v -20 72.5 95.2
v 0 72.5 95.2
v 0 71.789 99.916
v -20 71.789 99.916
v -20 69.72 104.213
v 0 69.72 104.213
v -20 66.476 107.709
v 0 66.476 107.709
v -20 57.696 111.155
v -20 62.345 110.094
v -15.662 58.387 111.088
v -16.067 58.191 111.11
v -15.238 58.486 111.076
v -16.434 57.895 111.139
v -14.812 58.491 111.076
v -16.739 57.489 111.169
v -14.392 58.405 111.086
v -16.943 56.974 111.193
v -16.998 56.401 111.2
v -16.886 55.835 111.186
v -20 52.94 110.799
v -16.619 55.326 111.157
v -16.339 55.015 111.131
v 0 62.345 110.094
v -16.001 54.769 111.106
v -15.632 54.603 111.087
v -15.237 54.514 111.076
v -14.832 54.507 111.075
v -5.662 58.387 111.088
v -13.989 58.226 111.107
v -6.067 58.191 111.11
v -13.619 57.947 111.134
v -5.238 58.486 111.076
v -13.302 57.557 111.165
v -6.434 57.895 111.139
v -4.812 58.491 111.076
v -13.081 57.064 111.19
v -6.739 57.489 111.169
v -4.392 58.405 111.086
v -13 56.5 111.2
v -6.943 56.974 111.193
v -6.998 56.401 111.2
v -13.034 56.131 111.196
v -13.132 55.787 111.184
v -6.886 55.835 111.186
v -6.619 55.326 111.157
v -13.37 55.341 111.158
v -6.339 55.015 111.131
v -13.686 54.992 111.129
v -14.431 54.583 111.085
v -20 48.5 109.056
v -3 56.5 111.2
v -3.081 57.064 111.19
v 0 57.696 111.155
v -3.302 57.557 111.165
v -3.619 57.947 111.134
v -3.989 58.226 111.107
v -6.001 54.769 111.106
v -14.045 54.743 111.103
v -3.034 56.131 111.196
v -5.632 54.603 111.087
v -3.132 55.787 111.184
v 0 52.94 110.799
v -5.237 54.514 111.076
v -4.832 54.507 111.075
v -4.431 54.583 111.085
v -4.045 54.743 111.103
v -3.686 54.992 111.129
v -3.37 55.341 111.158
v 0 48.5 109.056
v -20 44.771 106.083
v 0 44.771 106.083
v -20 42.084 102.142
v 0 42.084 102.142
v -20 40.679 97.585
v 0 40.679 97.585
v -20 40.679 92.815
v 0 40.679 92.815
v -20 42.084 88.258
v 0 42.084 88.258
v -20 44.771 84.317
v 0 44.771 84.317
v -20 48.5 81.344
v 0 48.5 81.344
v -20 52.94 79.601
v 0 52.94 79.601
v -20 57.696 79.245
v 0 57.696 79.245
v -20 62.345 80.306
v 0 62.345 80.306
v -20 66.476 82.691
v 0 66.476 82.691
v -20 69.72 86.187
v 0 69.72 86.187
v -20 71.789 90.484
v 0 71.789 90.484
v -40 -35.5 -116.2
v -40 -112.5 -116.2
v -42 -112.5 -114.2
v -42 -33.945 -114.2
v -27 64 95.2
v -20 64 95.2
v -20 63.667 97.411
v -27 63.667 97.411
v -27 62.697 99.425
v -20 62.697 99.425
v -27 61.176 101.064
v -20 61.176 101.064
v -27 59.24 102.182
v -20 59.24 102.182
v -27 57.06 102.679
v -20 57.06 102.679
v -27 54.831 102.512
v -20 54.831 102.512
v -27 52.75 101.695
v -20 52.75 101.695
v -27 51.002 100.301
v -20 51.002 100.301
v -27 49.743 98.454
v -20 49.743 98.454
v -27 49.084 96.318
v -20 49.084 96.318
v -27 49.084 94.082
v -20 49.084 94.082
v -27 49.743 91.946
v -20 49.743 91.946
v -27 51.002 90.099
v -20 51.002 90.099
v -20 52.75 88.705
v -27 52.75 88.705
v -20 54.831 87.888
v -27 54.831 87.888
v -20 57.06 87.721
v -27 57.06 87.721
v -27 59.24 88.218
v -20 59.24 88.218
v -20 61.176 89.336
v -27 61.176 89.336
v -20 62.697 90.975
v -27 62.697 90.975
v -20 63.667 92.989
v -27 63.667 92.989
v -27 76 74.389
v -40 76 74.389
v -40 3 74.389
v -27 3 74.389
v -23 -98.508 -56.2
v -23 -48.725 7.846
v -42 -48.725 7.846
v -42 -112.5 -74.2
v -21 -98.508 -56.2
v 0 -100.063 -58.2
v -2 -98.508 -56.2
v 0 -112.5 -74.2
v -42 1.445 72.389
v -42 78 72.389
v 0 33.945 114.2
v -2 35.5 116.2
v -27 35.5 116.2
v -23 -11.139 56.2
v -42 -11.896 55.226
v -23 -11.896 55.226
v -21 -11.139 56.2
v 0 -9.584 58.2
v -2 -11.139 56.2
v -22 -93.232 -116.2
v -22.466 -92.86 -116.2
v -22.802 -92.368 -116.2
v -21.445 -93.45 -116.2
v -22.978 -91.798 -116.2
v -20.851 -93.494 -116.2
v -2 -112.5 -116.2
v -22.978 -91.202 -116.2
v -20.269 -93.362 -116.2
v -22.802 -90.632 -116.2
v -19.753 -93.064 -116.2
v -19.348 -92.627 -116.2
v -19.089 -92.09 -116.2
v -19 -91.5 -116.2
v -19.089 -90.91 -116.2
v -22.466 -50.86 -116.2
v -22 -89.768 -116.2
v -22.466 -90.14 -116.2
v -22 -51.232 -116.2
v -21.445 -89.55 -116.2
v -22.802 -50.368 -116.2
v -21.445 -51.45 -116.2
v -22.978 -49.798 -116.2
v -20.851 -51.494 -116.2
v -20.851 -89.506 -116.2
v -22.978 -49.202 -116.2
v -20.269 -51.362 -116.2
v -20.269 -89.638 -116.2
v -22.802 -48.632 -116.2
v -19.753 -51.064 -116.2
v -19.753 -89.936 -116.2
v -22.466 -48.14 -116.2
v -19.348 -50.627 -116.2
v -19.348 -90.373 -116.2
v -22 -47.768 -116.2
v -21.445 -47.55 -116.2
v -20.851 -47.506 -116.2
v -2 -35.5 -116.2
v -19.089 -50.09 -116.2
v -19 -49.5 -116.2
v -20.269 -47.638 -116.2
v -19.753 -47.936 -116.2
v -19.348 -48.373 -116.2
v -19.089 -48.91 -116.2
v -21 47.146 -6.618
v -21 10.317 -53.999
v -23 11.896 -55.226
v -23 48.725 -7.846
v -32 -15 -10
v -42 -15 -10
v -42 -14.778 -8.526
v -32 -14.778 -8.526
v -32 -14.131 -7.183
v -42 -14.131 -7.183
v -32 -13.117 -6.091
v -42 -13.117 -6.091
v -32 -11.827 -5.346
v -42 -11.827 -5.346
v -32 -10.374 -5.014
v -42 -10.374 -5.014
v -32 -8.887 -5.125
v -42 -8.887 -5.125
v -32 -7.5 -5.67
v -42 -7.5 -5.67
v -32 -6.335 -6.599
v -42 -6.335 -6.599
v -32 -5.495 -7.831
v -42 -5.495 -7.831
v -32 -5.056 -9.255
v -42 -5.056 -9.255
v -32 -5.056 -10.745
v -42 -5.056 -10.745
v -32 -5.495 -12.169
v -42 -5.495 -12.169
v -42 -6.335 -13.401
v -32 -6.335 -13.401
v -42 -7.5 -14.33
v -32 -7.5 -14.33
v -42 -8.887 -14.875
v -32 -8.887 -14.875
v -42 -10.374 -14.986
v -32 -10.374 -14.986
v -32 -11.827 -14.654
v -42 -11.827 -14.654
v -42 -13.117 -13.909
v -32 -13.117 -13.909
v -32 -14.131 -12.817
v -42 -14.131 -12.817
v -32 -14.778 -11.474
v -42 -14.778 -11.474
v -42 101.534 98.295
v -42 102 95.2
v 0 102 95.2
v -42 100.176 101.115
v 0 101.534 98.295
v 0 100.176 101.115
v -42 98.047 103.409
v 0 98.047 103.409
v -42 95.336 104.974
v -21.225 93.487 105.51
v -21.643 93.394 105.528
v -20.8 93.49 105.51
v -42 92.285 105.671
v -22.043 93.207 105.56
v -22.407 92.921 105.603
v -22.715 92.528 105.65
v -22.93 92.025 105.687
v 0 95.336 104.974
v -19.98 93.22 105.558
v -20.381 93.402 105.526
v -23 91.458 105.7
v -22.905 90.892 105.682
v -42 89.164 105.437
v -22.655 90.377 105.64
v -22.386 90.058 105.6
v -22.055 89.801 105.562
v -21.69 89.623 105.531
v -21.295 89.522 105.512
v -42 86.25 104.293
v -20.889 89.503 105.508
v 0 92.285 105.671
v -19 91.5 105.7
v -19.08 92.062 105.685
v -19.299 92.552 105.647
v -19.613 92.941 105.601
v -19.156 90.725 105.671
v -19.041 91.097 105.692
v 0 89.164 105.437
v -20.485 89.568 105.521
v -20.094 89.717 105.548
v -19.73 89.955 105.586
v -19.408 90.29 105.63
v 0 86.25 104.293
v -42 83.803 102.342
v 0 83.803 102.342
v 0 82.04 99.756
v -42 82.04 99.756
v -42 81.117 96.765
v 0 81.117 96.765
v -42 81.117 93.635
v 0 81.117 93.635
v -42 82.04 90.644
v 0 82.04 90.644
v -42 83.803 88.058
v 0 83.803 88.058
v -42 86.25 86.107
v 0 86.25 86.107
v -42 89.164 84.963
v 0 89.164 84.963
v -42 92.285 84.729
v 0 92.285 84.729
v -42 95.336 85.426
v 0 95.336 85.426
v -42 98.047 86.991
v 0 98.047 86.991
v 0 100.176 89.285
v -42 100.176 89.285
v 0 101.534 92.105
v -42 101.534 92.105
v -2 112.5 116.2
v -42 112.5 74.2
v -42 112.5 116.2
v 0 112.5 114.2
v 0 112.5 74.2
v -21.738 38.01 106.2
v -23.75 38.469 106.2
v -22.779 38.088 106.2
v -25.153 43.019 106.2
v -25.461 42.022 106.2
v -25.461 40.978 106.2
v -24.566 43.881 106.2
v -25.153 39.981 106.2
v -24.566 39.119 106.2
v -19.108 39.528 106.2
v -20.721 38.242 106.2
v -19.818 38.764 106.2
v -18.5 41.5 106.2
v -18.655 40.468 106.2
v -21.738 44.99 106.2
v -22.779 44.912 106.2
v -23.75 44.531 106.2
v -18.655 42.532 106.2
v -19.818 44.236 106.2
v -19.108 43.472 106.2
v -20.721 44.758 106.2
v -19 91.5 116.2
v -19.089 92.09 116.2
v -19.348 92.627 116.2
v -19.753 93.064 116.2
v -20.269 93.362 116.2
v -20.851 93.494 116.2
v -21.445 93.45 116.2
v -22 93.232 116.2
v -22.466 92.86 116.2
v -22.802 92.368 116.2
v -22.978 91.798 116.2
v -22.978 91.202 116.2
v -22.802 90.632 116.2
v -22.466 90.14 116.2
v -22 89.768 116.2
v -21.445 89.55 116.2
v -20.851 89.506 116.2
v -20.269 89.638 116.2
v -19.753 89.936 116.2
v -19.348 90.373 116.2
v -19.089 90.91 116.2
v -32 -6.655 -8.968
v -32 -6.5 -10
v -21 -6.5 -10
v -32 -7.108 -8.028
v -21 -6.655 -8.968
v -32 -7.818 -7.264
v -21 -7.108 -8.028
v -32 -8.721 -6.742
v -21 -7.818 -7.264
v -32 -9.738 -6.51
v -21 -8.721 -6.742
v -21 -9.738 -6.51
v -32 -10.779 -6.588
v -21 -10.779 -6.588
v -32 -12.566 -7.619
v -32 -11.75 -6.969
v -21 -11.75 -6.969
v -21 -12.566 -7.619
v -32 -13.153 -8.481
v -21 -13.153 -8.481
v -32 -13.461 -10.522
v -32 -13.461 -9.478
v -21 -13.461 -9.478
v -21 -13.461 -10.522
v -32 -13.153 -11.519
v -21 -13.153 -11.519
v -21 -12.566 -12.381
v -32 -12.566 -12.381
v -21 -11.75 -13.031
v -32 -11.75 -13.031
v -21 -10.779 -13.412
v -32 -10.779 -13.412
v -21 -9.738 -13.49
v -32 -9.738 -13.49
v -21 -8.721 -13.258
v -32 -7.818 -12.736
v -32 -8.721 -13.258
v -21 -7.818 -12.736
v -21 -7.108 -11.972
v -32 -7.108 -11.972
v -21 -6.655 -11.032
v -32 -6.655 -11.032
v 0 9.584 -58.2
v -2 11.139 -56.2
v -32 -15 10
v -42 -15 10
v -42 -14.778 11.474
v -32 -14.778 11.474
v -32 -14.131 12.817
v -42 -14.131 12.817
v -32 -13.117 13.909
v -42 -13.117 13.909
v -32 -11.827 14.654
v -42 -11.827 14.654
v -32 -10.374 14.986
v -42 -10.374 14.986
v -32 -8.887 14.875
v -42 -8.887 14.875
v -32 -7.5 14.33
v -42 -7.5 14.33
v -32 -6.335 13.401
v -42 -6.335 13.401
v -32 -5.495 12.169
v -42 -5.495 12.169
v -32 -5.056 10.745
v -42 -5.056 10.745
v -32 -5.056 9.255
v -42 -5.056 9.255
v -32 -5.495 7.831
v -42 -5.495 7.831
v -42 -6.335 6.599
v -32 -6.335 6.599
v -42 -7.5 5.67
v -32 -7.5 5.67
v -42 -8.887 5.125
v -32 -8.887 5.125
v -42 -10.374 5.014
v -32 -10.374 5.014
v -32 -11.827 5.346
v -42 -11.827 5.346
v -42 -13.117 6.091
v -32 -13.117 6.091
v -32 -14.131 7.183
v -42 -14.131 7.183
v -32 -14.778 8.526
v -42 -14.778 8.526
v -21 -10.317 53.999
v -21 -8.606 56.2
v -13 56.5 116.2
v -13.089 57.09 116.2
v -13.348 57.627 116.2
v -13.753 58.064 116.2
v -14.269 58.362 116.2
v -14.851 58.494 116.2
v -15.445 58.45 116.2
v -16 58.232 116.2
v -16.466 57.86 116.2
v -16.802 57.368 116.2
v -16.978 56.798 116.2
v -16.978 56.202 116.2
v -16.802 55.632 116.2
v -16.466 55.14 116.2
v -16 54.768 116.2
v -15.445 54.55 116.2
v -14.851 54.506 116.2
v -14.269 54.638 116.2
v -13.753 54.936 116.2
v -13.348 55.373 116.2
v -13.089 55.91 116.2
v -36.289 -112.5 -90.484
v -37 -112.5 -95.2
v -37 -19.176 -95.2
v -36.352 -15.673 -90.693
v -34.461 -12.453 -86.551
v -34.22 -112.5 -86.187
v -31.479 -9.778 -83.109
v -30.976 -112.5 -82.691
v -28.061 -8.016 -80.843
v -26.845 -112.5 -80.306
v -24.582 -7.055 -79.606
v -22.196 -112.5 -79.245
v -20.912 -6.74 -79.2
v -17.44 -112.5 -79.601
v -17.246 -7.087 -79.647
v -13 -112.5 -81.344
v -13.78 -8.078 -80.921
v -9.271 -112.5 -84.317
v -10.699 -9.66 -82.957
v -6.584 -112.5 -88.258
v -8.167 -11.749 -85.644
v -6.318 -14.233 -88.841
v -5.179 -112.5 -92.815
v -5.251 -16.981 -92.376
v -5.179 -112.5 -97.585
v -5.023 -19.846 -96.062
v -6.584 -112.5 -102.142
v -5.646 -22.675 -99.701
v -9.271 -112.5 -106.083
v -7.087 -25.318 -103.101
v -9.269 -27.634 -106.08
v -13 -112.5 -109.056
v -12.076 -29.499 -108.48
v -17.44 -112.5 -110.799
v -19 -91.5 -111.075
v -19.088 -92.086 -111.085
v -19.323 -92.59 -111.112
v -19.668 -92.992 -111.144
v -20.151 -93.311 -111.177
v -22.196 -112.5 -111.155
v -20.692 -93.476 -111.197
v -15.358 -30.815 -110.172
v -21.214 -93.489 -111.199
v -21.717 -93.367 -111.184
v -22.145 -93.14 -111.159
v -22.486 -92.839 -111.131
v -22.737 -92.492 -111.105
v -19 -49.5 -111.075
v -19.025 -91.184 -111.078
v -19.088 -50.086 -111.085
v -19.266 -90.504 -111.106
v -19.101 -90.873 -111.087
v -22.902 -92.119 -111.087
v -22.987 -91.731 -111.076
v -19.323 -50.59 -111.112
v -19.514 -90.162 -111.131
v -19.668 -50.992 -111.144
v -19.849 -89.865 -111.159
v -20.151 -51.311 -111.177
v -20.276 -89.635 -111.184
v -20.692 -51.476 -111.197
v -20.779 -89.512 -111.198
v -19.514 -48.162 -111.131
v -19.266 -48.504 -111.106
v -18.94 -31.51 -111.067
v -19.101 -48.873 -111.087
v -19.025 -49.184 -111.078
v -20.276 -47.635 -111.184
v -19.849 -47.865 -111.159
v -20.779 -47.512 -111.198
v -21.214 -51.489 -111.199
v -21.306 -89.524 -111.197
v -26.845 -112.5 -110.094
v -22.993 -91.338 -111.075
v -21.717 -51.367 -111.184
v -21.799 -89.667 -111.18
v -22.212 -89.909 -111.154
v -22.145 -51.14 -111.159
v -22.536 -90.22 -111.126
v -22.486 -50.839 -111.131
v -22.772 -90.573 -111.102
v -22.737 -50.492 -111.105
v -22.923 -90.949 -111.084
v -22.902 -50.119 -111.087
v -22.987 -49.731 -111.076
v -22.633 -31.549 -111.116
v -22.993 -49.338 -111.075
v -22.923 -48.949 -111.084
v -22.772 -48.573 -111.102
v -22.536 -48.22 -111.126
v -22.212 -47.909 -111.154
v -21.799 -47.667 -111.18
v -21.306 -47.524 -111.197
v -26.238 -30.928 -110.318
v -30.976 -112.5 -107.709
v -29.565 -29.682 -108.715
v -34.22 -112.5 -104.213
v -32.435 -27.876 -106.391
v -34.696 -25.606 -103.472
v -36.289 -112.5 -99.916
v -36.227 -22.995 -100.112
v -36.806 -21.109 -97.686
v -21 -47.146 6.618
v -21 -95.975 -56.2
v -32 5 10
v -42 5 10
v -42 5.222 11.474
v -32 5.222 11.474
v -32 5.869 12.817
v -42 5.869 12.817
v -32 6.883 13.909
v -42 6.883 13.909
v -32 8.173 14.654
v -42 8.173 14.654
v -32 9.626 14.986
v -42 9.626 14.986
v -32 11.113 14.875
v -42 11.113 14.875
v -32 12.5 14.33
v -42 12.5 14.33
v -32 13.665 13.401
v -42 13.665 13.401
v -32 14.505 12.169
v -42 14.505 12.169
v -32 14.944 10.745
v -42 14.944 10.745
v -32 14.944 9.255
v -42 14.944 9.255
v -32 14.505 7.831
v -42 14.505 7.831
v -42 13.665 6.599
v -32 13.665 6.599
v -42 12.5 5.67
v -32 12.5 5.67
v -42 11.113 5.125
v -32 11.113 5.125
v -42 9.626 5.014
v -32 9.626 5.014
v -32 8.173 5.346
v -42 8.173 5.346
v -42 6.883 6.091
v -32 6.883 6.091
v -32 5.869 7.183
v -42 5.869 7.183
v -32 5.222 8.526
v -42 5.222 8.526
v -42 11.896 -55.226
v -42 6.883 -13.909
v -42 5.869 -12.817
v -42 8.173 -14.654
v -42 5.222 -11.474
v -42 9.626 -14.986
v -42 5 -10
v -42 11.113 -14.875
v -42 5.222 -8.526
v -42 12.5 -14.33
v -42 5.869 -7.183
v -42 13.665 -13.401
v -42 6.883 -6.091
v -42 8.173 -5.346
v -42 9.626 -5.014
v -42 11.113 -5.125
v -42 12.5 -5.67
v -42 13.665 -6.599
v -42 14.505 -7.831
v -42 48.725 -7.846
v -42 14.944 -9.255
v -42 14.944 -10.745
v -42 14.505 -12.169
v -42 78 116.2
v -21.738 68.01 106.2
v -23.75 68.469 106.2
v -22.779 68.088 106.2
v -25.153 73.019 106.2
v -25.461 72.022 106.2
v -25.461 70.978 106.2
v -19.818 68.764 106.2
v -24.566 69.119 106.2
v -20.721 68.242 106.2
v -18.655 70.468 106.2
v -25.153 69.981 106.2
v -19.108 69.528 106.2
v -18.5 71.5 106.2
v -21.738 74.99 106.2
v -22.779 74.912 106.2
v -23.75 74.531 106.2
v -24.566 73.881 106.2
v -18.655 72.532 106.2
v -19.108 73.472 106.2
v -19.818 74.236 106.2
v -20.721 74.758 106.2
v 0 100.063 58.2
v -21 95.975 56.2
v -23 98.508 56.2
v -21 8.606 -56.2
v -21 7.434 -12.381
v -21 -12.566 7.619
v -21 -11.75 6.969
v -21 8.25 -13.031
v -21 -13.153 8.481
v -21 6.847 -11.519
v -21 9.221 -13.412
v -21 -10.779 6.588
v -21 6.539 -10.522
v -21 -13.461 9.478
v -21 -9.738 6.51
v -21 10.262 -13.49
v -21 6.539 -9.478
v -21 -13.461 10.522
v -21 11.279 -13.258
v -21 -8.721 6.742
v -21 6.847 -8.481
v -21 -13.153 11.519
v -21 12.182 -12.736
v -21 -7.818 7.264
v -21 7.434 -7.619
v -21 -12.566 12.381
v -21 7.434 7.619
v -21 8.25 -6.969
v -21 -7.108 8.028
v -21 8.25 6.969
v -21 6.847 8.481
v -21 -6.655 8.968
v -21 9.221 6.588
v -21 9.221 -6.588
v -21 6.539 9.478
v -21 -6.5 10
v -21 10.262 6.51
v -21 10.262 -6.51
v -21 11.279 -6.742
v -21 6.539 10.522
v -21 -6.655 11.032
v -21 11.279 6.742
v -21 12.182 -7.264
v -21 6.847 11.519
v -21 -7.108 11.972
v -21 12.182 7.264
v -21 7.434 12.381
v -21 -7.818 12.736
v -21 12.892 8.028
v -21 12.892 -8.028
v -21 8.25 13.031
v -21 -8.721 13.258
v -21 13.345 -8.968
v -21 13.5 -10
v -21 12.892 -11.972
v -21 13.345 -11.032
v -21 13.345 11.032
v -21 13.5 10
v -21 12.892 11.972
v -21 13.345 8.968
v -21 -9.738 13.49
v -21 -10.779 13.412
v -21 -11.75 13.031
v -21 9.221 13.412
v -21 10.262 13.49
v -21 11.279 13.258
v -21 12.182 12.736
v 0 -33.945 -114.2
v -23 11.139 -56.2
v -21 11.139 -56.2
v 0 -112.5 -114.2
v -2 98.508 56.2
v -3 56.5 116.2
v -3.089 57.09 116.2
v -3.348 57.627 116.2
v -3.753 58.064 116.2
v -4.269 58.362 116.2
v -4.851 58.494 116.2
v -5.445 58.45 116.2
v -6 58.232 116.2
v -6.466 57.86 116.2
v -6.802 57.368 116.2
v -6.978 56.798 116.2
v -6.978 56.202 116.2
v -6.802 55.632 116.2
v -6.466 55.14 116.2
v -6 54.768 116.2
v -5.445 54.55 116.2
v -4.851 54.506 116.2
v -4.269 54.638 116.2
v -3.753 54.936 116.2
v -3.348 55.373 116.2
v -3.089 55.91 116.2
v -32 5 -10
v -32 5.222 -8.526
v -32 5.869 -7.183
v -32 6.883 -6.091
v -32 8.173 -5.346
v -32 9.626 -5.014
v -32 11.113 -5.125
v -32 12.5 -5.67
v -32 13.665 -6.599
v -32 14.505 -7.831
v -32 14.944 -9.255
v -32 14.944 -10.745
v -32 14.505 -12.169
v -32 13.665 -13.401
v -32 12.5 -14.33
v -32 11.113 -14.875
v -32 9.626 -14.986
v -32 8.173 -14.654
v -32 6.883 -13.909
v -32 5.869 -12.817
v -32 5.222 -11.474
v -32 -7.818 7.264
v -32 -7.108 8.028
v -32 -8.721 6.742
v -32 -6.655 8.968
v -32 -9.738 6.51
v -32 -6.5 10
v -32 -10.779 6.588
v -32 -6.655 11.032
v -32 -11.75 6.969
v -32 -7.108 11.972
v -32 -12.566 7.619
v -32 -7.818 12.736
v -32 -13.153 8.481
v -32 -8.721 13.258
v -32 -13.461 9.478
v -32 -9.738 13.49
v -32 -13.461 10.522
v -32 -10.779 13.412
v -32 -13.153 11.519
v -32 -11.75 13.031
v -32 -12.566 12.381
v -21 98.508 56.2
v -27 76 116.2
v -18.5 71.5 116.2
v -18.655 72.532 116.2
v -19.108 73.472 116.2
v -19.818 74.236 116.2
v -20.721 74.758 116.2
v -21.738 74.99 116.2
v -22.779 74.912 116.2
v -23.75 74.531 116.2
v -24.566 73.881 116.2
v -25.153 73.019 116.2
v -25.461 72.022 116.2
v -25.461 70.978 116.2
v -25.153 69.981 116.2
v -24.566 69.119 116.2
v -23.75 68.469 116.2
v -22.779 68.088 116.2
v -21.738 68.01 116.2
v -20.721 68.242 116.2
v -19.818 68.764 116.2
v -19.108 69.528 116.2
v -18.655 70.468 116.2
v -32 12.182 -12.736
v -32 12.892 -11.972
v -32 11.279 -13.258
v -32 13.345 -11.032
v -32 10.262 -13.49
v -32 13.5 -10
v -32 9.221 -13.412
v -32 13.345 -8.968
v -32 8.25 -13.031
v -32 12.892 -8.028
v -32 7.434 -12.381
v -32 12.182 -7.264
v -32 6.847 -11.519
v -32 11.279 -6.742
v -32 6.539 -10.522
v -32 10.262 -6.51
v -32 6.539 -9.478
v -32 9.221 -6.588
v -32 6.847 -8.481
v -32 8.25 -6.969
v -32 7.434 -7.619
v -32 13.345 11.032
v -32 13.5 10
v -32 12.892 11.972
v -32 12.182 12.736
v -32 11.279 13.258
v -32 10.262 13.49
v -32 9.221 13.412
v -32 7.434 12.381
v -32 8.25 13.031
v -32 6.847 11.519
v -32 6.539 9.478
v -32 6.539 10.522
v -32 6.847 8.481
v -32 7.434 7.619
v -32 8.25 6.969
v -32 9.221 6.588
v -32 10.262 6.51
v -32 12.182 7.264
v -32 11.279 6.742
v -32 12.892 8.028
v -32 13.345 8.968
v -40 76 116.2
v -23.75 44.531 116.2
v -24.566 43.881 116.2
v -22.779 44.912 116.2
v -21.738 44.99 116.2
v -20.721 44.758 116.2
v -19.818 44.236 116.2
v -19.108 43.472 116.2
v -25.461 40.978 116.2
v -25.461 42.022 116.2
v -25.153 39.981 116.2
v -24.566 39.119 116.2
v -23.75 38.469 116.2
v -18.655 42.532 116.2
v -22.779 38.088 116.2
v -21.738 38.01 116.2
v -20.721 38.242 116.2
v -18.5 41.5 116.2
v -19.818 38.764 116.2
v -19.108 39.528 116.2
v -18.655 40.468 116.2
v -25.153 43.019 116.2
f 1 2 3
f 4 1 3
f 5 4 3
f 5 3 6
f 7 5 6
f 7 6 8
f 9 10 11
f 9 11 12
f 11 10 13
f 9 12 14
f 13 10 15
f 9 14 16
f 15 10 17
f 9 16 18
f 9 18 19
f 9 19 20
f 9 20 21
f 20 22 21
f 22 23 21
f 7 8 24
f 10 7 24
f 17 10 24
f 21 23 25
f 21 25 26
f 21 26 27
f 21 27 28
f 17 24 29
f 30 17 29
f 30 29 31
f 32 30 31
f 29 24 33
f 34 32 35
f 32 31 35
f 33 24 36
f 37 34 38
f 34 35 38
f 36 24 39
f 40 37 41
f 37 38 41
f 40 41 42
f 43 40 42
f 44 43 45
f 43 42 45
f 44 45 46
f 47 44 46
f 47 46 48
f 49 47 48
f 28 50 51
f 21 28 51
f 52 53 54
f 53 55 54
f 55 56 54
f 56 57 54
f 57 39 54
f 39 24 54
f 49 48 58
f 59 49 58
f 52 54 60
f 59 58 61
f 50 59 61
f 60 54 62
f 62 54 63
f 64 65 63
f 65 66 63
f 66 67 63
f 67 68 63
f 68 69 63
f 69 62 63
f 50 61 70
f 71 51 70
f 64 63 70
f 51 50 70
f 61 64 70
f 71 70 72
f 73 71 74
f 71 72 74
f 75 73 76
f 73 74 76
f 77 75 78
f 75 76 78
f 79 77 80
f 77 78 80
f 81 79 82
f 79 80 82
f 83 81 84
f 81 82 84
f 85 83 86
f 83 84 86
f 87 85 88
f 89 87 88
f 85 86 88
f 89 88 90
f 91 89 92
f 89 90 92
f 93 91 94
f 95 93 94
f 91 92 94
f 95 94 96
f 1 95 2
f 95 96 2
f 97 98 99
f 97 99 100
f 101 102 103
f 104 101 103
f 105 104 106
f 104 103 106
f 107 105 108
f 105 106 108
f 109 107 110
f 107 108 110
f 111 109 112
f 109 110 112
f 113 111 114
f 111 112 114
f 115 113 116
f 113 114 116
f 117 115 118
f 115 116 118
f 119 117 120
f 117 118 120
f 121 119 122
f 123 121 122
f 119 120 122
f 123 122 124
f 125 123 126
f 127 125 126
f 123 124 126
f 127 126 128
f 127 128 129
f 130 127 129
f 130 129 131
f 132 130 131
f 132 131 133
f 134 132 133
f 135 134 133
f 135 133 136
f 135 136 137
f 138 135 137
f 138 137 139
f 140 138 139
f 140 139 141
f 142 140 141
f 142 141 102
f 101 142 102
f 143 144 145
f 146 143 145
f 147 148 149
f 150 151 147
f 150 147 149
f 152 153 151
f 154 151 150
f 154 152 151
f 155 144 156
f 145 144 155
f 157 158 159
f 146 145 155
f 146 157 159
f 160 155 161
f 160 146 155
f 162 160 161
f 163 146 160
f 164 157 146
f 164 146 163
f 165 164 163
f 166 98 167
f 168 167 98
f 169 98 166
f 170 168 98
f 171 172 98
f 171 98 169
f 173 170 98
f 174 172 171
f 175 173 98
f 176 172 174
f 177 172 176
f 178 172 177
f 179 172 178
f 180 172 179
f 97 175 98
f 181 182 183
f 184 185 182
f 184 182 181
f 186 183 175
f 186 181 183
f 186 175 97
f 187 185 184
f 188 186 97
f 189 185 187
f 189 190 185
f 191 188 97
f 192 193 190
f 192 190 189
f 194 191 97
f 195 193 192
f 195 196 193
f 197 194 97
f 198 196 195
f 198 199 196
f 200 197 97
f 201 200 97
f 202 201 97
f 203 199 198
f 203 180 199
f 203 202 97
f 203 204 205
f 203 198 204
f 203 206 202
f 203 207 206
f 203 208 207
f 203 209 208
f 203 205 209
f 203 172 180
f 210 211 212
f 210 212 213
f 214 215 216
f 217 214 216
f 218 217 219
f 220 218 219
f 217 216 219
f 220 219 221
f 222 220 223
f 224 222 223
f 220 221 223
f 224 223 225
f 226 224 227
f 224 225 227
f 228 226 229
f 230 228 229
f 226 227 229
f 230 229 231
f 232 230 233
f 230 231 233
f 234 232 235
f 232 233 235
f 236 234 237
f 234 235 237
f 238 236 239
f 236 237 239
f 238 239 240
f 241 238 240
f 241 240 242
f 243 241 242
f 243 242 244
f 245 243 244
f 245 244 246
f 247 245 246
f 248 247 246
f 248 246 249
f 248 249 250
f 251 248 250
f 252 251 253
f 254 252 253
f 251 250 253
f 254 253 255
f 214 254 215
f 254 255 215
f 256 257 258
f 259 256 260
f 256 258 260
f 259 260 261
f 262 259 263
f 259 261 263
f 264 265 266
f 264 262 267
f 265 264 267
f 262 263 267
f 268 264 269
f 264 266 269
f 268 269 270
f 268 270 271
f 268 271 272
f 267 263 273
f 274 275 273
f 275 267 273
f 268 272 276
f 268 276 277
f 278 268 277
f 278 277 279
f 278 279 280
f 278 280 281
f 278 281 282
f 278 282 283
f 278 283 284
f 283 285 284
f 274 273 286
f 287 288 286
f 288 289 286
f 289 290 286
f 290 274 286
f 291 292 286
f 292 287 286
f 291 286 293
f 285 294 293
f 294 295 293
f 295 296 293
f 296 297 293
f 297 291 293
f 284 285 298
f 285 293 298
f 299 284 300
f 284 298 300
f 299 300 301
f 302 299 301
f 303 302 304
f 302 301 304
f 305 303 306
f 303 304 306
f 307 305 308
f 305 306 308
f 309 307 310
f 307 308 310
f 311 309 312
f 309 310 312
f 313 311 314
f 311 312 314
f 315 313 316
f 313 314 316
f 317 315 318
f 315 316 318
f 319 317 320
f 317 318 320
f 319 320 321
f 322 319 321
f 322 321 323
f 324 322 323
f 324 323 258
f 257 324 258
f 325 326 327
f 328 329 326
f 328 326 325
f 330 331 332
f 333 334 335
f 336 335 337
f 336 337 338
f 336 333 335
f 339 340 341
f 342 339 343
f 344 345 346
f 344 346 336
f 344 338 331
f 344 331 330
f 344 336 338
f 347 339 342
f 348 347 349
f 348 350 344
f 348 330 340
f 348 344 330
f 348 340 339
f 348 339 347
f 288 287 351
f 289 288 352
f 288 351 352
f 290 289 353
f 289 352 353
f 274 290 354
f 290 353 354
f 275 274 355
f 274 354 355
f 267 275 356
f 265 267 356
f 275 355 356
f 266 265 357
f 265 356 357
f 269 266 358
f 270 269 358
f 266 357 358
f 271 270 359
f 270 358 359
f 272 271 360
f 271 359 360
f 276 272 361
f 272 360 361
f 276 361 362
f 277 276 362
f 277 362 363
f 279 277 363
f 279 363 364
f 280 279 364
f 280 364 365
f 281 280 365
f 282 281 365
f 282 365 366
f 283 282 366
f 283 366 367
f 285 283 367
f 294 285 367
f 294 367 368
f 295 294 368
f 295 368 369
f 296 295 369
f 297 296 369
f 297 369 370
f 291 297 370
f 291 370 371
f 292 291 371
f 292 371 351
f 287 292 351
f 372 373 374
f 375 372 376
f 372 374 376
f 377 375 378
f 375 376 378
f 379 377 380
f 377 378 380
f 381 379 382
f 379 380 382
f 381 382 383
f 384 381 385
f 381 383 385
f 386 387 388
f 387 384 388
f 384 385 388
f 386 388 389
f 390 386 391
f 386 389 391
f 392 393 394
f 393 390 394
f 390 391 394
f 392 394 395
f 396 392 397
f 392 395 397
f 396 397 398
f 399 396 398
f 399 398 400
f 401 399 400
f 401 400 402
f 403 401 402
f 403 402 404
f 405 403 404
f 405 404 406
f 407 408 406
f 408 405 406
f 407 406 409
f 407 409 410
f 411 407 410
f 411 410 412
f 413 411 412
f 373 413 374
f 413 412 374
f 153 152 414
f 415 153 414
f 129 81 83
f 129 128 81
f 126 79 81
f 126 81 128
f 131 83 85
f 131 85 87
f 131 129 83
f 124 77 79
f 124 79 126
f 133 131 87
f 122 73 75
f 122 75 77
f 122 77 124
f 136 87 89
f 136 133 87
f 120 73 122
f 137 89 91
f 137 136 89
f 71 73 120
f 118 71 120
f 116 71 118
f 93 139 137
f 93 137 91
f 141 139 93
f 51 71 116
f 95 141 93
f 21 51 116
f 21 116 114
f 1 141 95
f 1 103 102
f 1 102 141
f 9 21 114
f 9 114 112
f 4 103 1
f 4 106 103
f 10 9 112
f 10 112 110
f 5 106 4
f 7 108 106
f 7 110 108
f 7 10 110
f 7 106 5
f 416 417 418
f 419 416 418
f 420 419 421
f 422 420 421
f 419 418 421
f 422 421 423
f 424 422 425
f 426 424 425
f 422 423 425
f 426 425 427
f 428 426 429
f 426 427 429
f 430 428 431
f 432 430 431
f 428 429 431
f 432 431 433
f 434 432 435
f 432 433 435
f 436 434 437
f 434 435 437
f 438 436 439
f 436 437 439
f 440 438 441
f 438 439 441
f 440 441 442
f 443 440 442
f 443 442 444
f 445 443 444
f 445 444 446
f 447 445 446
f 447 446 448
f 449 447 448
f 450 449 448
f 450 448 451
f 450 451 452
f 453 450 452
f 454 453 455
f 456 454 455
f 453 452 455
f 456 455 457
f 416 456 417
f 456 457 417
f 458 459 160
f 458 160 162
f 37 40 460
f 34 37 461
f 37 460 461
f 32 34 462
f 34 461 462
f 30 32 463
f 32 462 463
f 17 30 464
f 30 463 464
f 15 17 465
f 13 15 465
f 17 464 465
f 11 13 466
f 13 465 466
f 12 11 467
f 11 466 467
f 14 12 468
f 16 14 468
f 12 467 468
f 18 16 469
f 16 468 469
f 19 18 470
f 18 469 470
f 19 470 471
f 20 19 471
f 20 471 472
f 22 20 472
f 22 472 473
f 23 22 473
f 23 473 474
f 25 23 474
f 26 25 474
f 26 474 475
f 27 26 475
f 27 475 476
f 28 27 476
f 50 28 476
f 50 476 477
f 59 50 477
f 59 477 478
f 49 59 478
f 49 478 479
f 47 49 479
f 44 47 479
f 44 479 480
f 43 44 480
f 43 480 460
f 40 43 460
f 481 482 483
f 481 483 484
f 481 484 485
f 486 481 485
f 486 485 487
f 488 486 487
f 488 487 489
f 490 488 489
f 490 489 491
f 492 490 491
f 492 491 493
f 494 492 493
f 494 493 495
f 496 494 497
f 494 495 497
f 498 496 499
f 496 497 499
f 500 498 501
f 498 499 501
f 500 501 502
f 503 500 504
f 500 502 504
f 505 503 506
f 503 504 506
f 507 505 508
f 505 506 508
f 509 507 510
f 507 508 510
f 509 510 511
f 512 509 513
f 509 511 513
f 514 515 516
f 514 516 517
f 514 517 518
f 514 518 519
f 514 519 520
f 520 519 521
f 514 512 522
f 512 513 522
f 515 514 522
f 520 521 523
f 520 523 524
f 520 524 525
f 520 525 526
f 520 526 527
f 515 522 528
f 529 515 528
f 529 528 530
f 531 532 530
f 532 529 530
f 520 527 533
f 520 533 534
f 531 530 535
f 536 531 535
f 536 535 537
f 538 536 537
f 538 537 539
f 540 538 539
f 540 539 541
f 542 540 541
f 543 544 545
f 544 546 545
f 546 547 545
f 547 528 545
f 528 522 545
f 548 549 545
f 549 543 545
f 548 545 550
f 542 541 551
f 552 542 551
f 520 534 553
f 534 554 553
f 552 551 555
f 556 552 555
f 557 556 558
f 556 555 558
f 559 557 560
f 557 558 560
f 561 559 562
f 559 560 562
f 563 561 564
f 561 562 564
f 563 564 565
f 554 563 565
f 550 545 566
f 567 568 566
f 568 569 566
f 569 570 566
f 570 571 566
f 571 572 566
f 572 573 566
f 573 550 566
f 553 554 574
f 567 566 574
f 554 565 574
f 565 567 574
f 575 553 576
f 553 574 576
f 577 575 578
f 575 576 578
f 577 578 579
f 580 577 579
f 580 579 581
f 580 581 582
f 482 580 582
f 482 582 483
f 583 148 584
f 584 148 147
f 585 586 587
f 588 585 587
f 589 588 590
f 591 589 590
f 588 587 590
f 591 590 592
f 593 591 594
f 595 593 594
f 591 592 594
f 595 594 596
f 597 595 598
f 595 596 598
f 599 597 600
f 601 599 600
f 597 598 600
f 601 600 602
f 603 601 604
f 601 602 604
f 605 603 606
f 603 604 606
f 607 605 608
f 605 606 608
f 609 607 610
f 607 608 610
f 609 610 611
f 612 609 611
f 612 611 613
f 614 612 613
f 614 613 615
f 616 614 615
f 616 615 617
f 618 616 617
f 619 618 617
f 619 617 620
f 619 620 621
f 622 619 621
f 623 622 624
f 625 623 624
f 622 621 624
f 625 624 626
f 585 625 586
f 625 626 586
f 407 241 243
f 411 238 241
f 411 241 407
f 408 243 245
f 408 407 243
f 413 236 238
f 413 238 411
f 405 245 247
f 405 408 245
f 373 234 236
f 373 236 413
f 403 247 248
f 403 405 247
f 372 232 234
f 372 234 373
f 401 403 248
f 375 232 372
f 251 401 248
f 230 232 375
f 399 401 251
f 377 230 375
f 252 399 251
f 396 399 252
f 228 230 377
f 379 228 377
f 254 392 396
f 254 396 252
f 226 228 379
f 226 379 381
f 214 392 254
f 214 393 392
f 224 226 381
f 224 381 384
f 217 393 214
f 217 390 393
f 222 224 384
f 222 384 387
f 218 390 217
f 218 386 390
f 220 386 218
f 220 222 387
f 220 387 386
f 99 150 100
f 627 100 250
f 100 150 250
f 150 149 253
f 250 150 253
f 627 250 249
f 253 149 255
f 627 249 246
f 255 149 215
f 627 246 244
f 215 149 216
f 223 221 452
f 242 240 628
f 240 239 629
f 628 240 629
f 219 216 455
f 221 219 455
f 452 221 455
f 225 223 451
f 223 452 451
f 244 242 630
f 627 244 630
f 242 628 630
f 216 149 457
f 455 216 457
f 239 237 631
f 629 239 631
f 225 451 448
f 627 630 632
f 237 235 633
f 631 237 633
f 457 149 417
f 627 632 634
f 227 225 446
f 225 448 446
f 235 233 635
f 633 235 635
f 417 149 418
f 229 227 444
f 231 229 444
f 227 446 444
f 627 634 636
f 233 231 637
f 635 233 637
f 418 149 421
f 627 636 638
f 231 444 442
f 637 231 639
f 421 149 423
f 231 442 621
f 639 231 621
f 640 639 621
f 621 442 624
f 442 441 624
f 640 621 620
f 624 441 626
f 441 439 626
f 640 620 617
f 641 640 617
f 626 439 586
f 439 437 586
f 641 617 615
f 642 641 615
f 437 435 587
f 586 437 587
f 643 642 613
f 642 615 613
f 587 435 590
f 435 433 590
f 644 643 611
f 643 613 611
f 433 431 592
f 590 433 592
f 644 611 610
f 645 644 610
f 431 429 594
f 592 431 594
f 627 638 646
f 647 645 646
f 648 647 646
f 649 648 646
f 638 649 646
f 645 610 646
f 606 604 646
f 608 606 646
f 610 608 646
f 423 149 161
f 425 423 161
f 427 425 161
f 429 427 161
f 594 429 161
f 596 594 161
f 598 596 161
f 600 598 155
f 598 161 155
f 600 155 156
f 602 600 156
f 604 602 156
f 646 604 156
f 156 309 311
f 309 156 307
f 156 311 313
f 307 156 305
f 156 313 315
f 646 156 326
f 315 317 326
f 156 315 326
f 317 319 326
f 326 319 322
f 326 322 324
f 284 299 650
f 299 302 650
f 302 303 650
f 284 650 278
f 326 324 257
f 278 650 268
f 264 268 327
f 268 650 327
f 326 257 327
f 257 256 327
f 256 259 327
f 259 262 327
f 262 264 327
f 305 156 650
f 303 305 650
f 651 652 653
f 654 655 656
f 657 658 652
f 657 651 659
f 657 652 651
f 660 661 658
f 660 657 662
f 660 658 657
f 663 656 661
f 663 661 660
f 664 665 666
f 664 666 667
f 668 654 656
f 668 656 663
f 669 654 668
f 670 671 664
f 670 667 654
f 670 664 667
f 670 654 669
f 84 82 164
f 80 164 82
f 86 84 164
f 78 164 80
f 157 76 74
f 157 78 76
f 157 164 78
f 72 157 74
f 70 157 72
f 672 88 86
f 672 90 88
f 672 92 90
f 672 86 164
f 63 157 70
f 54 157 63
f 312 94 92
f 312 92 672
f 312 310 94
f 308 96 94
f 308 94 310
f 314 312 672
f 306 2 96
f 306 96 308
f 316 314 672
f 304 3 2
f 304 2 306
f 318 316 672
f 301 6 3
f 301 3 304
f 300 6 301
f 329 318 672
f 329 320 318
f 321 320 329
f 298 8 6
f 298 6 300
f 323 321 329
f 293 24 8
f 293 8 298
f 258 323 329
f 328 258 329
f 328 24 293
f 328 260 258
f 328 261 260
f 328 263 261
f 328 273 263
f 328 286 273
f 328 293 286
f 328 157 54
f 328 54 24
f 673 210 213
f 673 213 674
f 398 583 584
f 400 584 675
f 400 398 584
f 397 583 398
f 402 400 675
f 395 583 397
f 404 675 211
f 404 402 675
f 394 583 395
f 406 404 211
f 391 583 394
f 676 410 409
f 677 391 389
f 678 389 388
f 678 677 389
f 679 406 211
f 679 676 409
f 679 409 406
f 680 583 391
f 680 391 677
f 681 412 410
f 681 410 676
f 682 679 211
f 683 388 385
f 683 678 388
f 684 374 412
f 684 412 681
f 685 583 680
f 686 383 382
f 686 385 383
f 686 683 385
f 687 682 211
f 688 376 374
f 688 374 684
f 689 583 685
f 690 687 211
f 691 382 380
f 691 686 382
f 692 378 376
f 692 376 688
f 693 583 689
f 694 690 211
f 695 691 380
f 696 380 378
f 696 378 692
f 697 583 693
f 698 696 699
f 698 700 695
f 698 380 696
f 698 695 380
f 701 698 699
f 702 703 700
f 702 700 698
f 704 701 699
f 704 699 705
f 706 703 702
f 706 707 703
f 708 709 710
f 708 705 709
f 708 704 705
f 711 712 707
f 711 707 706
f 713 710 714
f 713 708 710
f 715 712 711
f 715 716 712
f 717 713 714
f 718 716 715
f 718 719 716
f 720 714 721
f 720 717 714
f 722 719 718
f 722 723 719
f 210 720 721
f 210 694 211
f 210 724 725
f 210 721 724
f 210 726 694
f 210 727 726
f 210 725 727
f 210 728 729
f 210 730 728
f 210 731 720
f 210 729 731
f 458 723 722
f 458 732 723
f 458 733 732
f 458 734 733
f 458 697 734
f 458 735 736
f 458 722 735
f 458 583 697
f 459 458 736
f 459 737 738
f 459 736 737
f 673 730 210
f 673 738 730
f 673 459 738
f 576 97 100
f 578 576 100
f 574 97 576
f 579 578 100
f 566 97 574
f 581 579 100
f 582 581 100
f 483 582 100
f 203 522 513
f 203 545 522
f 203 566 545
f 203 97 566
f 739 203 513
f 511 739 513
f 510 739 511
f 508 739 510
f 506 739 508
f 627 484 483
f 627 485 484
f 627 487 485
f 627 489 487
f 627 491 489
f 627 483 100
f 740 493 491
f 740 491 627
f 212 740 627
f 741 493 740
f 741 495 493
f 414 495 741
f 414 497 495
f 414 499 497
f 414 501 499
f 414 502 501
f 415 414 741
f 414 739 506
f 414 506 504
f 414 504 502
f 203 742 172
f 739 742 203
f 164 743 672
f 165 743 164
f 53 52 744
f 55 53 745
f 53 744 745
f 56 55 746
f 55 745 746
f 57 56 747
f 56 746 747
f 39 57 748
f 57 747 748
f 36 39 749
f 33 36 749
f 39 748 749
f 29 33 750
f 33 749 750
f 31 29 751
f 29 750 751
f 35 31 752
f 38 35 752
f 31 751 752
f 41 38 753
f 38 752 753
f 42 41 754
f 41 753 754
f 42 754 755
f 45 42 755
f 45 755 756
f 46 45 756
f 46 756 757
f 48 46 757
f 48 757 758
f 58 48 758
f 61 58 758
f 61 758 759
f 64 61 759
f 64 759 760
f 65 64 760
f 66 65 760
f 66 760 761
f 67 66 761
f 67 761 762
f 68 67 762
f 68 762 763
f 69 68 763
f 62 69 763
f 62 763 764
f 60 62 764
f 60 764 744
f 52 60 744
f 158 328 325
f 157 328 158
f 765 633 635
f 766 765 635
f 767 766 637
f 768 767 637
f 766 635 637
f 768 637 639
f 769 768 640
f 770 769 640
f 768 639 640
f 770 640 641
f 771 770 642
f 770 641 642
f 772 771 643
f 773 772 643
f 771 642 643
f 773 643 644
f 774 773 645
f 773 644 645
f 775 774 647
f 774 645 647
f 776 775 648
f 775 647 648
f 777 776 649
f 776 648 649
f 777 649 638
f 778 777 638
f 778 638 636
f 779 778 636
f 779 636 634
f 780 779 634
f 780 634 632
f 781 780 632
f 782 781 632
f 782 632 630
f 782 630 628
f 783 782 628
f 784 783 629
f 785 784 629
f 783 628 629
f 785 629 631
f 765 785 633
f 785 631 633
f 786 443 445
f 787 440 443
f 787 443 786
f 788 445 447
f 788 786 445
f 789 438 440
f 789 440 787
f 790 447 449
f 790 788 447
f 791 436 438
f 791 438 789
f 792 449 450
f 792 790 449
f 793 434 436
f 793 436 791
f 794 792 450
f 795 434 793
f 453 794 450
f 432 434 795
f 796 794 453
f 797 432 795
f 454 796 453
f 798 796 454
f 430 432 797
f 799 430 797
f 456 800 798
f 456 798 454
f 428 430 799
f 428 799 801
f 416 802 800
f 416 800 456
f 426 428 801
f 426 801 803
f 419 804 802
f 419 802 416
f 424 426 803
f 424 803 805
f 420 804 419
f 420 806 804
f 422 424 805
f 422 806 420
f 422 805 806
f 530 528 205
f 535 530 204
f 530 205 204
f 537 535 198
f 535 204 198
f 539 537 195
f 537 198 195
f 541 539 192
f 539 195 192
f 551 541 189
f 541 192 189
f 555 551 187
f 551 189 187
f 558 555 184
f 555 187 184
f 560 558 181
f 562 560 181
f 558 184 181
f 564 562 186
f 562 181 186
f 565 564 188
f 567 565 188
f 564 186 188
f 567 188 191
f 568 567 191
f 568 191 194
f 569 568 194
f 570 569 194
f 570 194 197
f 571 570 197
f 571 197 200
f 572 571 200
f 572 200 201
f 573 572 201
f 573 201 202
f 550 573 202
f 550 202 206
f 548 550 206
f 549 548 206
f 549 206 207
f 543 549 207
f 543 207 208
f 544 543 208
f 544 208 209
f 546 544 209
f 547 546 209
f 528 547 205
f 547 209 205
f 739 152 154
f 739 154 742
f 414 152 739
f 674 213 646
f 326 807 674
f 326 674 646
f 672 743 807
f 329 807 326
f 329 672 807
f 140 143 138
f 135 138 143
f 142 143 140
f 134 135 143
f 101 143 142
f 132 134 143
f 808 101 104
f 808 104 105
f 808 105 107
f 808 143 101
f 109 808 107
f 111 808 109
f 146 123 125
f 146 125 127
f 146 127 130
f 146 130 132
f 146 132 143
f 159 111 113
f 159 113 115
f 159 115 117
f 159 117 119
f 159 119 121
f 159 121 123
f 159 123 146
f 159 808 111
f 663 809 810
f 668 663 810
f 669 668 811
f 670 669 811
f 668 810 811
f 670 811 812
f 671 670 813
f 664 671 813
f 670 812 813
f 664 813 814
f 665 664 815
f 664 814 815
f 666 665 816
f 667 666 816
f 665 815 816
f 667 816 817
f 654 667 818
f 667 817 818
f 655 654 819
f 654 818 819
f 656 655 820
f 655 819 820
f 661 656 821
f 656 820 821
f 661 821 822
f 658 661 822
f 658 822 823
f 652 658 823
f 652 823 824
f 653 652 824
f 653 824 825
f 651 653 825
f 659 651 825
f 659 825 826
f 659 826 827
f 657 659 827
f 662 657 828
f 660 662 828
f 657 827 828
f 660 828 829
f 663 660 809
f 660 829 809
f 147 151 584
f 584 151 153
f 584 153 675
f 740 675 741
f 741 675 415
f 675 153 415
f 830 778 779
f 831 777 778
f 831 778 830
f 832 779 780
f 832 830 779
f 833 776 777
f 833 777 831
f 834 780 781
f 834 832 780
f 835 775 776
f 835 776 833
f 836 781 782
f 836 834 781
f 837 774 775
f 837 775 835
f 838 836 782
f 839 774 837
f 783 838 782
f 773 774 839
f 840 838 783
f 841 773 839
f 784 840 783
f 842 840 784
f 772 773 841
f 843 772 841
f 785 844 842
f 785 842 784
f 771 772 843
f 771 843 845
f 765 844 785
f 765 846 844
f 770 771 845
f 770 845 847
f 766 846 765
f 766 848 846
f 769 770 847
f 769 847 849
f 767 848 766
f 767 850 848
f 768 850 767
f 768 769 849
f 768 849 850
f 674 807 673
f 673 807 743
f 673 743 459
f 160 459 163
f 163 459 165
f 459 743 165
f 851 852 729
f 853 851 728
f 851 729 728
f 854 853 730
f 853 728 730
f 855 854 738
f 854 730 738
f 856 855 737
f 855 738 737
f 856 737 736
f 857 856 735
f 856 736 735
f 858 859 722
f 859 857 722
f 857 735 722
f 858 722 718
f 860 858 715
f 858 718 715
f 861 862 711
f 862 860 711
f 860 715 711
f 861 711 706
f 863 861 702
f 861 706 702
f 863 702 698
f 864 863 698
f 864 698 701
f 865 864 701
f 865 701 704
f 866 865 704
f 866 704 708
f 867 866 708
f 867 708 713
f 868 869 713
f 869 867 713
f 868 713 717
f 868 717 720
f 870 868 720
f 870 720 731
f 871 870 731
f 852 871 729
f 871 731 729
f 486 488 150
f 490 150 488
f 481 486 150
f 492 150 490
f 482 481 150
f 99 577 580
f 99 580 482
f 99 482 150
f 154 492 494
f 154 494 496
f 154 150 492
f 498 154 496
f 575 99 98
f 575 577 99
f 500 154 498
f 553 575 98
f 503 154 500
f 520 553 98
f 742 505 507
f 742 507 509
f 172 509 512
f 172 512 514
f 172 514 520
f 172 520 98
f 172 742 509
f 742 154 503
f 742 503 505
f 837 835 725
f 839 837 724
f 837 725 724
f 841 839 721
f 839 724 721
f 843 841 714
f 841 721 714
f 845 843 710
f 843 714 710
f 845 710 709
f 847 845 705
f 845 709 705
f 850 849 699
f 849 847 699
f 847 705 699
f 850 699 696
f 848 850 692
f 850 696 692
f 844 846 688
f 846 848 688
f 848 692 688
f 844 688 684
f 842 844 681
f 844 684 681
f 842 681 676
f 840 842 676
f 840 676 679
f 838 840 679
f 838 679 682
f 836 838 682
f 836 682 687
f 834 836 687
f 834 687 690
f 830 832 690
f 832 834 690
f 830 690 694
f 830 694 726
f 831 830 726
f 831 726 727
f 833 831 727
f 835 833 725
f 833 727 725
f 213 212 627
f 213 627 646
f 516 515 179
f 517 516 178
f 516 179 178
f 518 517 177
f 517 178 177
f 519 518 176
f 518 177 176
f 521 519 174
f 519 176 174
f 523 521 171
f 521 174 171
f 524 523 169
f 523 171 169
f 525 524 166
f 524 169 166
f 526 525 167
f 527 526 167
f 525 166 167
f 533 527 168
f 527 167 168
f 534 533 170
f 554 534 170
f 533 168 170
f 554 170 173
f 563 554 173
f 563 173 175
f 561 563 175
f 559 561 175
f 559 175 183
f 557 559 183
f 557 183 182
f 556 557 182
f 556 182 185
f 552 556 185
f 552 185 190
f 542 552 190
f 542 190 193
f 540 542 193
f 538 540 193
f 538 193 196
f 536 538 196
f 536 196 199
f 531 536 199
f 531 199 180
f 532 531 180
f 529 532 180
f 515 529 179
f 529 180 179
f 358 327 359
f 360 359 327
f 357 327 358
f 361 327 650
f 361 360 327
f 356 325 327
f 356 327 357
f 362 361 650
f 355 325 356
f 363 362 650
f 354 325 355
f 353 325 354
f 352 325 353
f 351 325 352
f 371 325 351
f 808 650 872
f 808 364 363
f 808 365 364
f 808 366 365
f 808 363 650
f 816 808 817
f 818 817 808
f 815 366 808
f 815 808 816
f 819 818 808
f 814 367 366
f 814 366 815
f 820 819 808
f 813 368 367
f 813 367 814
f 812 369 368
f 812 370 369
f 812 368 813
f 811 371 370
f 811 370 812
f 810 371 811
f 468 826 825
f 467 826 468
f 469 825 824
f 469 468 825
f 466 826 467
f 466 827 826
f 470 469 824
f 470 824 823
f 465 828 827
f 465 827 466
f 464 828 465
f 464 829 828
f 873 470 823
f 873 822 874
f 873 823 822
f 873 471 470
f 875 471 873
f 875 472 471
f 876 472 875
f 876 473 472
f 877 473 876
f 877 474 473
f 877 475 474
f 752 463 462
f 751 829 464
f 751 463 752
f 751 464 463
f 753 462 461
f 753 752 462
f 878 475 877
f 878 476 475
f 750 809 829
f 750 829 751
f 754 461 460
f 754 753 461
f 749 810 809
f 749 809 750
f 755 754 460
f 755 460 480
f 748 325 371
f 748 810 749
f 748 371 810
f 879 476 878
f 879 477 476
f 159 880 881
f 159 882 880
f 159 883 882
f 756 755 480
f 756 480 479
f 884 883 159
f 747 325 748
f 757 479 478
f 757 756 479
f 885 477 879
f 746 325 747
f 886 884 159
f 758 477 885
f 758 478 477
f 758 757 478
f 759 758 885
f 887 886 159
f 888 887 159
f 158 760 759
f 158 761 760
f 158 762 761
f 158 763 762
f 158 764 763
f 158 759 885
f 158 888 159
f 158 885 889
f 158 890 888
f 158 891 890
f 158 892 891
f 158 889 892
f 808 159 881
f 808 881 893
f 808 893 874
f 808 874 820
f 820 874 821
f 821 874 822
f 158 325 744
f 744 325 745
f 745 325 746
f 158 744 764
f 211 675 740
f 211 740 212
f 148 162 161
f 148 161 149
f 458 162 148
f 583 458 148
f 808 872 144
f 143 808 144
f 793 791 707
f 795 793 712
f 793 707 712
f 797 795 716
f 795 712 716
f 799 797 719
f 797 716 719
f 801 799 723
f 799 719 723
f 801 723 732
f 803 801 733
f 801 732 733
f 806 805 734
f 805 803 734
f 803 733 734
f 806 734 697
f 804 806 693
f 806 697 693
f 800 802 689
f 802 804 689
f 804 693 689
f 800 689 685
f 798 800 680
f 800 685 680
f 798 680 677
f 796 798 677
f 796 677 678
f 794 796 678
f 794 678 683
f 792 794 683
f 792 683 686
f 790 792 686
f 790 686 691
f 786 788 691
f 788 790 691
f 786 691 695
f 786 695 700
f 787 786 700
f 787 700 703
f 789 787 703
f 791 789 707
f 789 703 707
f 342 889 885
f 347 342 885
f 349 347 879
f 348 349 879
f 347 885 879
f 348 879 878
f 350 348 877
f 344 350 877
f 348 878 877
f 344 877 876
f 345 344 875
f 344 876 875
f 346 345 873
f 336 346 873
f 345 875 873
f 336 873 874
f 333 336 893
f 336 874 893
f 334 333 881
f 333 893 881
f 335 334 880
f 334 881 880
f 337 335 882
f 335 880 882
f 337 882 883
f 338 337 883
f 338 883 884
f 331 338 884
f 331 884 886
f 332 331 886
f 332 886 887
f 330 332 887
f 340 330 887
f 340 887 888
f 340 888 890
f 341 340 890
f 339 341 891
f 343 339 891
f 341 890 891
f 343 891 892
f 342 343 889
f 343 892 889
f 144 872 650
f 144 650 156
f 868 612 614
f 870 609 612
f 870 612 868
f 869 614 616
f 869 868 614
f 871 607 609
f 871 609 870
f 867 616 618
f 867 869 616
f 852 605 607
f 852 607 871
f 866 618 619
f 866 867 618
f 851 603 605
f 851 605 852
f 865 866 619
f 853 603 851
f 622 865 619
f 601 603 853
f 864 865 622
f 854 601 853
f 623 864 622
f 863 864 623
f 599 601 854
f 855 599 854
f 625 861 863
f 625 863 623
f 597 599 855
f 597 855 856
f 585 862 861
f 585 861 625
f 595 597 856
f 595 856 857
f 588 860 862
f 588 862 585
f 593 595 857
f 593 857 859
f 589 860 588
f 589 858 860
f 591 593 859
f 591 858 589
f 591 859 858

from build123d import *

# Parameters (mm, degrees)
F0_R      = 7.5
F0_R_2    = 10.5
F0_R_3    = 3.5
F1_DEPTH  = 42
F2_R      = 5
F2_R_2    = 3.5
F3_DEPTH  = 10
F4_R      = 3.5
F5_DEPTH  = 21
F6_R      = 16
F7_DEPTH  = 250
F8_R      = 2
F9_DEPTH  = 25
F10_R     = 7.5
F11_DEPTH = 15
F12_R     = 2
F13_DEPTH = 25
F14_R     = 16
F15_DEPTH = 20
F16_SIZE  = 2
F12_R_2   = 3.5
F17_DEPTH = 10


with BuildPart() as f1:
    # F0 (on Right) → F1 (new body)
    with BuildSketch(Plane.YZ):
        Polygon((112.5, 74.2), (112.5, 116.2), (35.5, 116.2), (-11.89577, 55.225982), (48.724809, -7.845921), align=None)
        with Locations((56.5, 95.2)):
            Circle(F0_R, mode=Mode.SUBTRACT)
        with Locations((91.5, 95.2)):
            Circle(F0_R_2, mode=Mode.SUBTRACT)
        Polygon((48.724809, -7.845921), (-11.89577, 55.225982), (-48.724809, 7.845921), (11.89577, -55.225982), align=None)
        with Locations((-10, -10)):
            Circle(F0_R_3, mode=Mode.SUBTRACT)
        with Locations((10, -10)):
            Circle(F0_R_3, mode=Mode.SUBTRACT)
        with Locations((-10, 10)):
            Circle(F0_R_3, mode=Mode.SUBTRACT)
        with Locations((10, 10)):
            Circle(F0_R_3, mode=Mode.SUBTRACT)
        Polygon((11.89577, -55.225982), (-48.724809, 7.845921), (-112.5, -74.2), (-112.5, -116.2), (-35.5, -116.2), align=None)
    extrude(amount=-F1_DEPTH)

    # F2 (on face) → F3 (cut)
    with BuildSketch(Plane(origin=(-42, 0, 0), x_dir=(0, -1, 0), z_dir=(-1, 0, 0))):
        with Locations((-10, 10)):
            Circle(F2_R)
        with Locations((-10, 10)):
            Circle(F2_R_2, mode=Mode.SUBTRACT)
        with Locations((-10, -10)):
            Circle(F2_R)
        with Locations((-10, -10)):
            Circle(F2_R_2, mode=Mode.SUBTRACT)
        with Locations((10, 10)):
            Circle(F2_R)
        with Locations((10, 10)):
            Circle(F2_R_2, mode=Mode.SUBTRACT)
        with Locations((10, -10)):
            Circle(F2_R)
        with Locations((10, -10)):
            Circle(F2_R_2, mode=Mode.SUBTRACT)
    extrude(amount=-F3_DEPTH, mode=Mode.SUBTRACT)

    # F4 (on face) → F5 (cut)
    with BuildSketch(Plane.YZ):
        Polygon((11.138655, -56.2), (98.508403, 56.2), (-11.138655, 56.2), (-98.508403, -56.2), align=None)
        with Locations((-10, -10)):
            Circle(F4_R, mode=Mode.SUBTRACT)
        with Locations((10, -10)):
            Circle(F4_R, mode=Mode.SUBTRACT)
        with Locations((-10, 10)):
            Circle(F4_R, mode=Mode.SUBTRACT)
        with Locations((10, 10)):
            Circle(F4_R, mode=Mode.SUBTRACT)
    extrude(amount=-F5_DEPTH, mode=Mode.SUBTRACT)

    # F6 (on face) → F7 (cut)
    with BuildSketch(Plane(origin=(0, 112.5, 0), x_dir=(-1, 0, 0), z_dir=(0, 1, 0))):
        with Locations((21, -95.2)):
            Circle(F6_R)
    extrude(amount=-F7_DEPTH, mode=Mode.SUBTRACT)

    # F8 (on face) → F9 (cut)
    with BuildSketch(Plane(origin=(0, 0, -116.2), x_dir=(1, 0, 0), z_dir=(0, 0, -1))):
        with Locations((-21, 49.5)):
            Circle(F8_R)
        with Locations((-21, 91.5)):
            Circle(F8_R)
    extrude(amount=-F9_DEPTH, mode=Mode.SUBTRACT)

    # F10 (on face) → F11 (cut)
    with BuildSketch(Plane(origin=(-42, 0, 0), x_dir=(0, -1, 0), z_dir=(-1, 0, 0))):
        Polygon((-35.5, 116.2), (-76, 116.2), (-76, 74.389189), (-3, 74.389189), align=None)
        with Locations((-56.5, 95.2)):
            Circle(F10_R, mode=Mode.SUBTRACT)
        Polygon((-3, 116.389189), (-76, 116.389189), (-76, 116.2), (-35.5, 116.2), (-3, 74.389189), align=None)
    extrude(amount=-F11_DEPTH, mode=Mode.SUBTRACT)

    # F12 (on face) → F13 (cut)
    with BuildSketch(Plane.XY.offset(116.2)):
        with Locations((-21, 91.5)):
            Circle(F12_R)
        with Locations((-15, 56.5)):
            Circle(F12_R)
        with Locations((-5, 56.5)):
            Circle(F12_R)
    extrude(amount=-F13_DEPTH, mode=Mode.SUBTRACT)

    # F14 (on face) → F15 (cut)
    with BuildSketch(Plane.YZ):
        with Locations((56.5, 95.2)):
            Circle(F14_R)
    extrude(amount=-F15_DEPTH, mode=Mode.SUBTRACT)

    # F16
    f16_edges = [f1.edges().sort_by_distance(p)[0] for p in [
        (0, 43.684874, 56.2),
        (0, -43.684874, -56.2),
        (-42, -74, -116.2),
        (0, -74, -116.2),
        (0, 74, 116.2),
        (-21, -54.823529, 0),
        (-21, 54.823529, 0),
        (-42, 39.5, 74.389189),
        (-42, 76, 95.294595),
    ]]
    chamfer(f16_edges, length=F16_SIZE)

    # F12 (on face) → F17 (cut)
    with BuildSketch(Plane.XY.offset(116.2)):
        with Locations((-22, 71.5)):
            Circle(F12_R_2)
        with Locations((-22, 41.5)):
            Circle(F12_R_2)
    extrude(amount=-F17_DEPTH, mode=Mode.SUBTRACT)


solid = f1.part
